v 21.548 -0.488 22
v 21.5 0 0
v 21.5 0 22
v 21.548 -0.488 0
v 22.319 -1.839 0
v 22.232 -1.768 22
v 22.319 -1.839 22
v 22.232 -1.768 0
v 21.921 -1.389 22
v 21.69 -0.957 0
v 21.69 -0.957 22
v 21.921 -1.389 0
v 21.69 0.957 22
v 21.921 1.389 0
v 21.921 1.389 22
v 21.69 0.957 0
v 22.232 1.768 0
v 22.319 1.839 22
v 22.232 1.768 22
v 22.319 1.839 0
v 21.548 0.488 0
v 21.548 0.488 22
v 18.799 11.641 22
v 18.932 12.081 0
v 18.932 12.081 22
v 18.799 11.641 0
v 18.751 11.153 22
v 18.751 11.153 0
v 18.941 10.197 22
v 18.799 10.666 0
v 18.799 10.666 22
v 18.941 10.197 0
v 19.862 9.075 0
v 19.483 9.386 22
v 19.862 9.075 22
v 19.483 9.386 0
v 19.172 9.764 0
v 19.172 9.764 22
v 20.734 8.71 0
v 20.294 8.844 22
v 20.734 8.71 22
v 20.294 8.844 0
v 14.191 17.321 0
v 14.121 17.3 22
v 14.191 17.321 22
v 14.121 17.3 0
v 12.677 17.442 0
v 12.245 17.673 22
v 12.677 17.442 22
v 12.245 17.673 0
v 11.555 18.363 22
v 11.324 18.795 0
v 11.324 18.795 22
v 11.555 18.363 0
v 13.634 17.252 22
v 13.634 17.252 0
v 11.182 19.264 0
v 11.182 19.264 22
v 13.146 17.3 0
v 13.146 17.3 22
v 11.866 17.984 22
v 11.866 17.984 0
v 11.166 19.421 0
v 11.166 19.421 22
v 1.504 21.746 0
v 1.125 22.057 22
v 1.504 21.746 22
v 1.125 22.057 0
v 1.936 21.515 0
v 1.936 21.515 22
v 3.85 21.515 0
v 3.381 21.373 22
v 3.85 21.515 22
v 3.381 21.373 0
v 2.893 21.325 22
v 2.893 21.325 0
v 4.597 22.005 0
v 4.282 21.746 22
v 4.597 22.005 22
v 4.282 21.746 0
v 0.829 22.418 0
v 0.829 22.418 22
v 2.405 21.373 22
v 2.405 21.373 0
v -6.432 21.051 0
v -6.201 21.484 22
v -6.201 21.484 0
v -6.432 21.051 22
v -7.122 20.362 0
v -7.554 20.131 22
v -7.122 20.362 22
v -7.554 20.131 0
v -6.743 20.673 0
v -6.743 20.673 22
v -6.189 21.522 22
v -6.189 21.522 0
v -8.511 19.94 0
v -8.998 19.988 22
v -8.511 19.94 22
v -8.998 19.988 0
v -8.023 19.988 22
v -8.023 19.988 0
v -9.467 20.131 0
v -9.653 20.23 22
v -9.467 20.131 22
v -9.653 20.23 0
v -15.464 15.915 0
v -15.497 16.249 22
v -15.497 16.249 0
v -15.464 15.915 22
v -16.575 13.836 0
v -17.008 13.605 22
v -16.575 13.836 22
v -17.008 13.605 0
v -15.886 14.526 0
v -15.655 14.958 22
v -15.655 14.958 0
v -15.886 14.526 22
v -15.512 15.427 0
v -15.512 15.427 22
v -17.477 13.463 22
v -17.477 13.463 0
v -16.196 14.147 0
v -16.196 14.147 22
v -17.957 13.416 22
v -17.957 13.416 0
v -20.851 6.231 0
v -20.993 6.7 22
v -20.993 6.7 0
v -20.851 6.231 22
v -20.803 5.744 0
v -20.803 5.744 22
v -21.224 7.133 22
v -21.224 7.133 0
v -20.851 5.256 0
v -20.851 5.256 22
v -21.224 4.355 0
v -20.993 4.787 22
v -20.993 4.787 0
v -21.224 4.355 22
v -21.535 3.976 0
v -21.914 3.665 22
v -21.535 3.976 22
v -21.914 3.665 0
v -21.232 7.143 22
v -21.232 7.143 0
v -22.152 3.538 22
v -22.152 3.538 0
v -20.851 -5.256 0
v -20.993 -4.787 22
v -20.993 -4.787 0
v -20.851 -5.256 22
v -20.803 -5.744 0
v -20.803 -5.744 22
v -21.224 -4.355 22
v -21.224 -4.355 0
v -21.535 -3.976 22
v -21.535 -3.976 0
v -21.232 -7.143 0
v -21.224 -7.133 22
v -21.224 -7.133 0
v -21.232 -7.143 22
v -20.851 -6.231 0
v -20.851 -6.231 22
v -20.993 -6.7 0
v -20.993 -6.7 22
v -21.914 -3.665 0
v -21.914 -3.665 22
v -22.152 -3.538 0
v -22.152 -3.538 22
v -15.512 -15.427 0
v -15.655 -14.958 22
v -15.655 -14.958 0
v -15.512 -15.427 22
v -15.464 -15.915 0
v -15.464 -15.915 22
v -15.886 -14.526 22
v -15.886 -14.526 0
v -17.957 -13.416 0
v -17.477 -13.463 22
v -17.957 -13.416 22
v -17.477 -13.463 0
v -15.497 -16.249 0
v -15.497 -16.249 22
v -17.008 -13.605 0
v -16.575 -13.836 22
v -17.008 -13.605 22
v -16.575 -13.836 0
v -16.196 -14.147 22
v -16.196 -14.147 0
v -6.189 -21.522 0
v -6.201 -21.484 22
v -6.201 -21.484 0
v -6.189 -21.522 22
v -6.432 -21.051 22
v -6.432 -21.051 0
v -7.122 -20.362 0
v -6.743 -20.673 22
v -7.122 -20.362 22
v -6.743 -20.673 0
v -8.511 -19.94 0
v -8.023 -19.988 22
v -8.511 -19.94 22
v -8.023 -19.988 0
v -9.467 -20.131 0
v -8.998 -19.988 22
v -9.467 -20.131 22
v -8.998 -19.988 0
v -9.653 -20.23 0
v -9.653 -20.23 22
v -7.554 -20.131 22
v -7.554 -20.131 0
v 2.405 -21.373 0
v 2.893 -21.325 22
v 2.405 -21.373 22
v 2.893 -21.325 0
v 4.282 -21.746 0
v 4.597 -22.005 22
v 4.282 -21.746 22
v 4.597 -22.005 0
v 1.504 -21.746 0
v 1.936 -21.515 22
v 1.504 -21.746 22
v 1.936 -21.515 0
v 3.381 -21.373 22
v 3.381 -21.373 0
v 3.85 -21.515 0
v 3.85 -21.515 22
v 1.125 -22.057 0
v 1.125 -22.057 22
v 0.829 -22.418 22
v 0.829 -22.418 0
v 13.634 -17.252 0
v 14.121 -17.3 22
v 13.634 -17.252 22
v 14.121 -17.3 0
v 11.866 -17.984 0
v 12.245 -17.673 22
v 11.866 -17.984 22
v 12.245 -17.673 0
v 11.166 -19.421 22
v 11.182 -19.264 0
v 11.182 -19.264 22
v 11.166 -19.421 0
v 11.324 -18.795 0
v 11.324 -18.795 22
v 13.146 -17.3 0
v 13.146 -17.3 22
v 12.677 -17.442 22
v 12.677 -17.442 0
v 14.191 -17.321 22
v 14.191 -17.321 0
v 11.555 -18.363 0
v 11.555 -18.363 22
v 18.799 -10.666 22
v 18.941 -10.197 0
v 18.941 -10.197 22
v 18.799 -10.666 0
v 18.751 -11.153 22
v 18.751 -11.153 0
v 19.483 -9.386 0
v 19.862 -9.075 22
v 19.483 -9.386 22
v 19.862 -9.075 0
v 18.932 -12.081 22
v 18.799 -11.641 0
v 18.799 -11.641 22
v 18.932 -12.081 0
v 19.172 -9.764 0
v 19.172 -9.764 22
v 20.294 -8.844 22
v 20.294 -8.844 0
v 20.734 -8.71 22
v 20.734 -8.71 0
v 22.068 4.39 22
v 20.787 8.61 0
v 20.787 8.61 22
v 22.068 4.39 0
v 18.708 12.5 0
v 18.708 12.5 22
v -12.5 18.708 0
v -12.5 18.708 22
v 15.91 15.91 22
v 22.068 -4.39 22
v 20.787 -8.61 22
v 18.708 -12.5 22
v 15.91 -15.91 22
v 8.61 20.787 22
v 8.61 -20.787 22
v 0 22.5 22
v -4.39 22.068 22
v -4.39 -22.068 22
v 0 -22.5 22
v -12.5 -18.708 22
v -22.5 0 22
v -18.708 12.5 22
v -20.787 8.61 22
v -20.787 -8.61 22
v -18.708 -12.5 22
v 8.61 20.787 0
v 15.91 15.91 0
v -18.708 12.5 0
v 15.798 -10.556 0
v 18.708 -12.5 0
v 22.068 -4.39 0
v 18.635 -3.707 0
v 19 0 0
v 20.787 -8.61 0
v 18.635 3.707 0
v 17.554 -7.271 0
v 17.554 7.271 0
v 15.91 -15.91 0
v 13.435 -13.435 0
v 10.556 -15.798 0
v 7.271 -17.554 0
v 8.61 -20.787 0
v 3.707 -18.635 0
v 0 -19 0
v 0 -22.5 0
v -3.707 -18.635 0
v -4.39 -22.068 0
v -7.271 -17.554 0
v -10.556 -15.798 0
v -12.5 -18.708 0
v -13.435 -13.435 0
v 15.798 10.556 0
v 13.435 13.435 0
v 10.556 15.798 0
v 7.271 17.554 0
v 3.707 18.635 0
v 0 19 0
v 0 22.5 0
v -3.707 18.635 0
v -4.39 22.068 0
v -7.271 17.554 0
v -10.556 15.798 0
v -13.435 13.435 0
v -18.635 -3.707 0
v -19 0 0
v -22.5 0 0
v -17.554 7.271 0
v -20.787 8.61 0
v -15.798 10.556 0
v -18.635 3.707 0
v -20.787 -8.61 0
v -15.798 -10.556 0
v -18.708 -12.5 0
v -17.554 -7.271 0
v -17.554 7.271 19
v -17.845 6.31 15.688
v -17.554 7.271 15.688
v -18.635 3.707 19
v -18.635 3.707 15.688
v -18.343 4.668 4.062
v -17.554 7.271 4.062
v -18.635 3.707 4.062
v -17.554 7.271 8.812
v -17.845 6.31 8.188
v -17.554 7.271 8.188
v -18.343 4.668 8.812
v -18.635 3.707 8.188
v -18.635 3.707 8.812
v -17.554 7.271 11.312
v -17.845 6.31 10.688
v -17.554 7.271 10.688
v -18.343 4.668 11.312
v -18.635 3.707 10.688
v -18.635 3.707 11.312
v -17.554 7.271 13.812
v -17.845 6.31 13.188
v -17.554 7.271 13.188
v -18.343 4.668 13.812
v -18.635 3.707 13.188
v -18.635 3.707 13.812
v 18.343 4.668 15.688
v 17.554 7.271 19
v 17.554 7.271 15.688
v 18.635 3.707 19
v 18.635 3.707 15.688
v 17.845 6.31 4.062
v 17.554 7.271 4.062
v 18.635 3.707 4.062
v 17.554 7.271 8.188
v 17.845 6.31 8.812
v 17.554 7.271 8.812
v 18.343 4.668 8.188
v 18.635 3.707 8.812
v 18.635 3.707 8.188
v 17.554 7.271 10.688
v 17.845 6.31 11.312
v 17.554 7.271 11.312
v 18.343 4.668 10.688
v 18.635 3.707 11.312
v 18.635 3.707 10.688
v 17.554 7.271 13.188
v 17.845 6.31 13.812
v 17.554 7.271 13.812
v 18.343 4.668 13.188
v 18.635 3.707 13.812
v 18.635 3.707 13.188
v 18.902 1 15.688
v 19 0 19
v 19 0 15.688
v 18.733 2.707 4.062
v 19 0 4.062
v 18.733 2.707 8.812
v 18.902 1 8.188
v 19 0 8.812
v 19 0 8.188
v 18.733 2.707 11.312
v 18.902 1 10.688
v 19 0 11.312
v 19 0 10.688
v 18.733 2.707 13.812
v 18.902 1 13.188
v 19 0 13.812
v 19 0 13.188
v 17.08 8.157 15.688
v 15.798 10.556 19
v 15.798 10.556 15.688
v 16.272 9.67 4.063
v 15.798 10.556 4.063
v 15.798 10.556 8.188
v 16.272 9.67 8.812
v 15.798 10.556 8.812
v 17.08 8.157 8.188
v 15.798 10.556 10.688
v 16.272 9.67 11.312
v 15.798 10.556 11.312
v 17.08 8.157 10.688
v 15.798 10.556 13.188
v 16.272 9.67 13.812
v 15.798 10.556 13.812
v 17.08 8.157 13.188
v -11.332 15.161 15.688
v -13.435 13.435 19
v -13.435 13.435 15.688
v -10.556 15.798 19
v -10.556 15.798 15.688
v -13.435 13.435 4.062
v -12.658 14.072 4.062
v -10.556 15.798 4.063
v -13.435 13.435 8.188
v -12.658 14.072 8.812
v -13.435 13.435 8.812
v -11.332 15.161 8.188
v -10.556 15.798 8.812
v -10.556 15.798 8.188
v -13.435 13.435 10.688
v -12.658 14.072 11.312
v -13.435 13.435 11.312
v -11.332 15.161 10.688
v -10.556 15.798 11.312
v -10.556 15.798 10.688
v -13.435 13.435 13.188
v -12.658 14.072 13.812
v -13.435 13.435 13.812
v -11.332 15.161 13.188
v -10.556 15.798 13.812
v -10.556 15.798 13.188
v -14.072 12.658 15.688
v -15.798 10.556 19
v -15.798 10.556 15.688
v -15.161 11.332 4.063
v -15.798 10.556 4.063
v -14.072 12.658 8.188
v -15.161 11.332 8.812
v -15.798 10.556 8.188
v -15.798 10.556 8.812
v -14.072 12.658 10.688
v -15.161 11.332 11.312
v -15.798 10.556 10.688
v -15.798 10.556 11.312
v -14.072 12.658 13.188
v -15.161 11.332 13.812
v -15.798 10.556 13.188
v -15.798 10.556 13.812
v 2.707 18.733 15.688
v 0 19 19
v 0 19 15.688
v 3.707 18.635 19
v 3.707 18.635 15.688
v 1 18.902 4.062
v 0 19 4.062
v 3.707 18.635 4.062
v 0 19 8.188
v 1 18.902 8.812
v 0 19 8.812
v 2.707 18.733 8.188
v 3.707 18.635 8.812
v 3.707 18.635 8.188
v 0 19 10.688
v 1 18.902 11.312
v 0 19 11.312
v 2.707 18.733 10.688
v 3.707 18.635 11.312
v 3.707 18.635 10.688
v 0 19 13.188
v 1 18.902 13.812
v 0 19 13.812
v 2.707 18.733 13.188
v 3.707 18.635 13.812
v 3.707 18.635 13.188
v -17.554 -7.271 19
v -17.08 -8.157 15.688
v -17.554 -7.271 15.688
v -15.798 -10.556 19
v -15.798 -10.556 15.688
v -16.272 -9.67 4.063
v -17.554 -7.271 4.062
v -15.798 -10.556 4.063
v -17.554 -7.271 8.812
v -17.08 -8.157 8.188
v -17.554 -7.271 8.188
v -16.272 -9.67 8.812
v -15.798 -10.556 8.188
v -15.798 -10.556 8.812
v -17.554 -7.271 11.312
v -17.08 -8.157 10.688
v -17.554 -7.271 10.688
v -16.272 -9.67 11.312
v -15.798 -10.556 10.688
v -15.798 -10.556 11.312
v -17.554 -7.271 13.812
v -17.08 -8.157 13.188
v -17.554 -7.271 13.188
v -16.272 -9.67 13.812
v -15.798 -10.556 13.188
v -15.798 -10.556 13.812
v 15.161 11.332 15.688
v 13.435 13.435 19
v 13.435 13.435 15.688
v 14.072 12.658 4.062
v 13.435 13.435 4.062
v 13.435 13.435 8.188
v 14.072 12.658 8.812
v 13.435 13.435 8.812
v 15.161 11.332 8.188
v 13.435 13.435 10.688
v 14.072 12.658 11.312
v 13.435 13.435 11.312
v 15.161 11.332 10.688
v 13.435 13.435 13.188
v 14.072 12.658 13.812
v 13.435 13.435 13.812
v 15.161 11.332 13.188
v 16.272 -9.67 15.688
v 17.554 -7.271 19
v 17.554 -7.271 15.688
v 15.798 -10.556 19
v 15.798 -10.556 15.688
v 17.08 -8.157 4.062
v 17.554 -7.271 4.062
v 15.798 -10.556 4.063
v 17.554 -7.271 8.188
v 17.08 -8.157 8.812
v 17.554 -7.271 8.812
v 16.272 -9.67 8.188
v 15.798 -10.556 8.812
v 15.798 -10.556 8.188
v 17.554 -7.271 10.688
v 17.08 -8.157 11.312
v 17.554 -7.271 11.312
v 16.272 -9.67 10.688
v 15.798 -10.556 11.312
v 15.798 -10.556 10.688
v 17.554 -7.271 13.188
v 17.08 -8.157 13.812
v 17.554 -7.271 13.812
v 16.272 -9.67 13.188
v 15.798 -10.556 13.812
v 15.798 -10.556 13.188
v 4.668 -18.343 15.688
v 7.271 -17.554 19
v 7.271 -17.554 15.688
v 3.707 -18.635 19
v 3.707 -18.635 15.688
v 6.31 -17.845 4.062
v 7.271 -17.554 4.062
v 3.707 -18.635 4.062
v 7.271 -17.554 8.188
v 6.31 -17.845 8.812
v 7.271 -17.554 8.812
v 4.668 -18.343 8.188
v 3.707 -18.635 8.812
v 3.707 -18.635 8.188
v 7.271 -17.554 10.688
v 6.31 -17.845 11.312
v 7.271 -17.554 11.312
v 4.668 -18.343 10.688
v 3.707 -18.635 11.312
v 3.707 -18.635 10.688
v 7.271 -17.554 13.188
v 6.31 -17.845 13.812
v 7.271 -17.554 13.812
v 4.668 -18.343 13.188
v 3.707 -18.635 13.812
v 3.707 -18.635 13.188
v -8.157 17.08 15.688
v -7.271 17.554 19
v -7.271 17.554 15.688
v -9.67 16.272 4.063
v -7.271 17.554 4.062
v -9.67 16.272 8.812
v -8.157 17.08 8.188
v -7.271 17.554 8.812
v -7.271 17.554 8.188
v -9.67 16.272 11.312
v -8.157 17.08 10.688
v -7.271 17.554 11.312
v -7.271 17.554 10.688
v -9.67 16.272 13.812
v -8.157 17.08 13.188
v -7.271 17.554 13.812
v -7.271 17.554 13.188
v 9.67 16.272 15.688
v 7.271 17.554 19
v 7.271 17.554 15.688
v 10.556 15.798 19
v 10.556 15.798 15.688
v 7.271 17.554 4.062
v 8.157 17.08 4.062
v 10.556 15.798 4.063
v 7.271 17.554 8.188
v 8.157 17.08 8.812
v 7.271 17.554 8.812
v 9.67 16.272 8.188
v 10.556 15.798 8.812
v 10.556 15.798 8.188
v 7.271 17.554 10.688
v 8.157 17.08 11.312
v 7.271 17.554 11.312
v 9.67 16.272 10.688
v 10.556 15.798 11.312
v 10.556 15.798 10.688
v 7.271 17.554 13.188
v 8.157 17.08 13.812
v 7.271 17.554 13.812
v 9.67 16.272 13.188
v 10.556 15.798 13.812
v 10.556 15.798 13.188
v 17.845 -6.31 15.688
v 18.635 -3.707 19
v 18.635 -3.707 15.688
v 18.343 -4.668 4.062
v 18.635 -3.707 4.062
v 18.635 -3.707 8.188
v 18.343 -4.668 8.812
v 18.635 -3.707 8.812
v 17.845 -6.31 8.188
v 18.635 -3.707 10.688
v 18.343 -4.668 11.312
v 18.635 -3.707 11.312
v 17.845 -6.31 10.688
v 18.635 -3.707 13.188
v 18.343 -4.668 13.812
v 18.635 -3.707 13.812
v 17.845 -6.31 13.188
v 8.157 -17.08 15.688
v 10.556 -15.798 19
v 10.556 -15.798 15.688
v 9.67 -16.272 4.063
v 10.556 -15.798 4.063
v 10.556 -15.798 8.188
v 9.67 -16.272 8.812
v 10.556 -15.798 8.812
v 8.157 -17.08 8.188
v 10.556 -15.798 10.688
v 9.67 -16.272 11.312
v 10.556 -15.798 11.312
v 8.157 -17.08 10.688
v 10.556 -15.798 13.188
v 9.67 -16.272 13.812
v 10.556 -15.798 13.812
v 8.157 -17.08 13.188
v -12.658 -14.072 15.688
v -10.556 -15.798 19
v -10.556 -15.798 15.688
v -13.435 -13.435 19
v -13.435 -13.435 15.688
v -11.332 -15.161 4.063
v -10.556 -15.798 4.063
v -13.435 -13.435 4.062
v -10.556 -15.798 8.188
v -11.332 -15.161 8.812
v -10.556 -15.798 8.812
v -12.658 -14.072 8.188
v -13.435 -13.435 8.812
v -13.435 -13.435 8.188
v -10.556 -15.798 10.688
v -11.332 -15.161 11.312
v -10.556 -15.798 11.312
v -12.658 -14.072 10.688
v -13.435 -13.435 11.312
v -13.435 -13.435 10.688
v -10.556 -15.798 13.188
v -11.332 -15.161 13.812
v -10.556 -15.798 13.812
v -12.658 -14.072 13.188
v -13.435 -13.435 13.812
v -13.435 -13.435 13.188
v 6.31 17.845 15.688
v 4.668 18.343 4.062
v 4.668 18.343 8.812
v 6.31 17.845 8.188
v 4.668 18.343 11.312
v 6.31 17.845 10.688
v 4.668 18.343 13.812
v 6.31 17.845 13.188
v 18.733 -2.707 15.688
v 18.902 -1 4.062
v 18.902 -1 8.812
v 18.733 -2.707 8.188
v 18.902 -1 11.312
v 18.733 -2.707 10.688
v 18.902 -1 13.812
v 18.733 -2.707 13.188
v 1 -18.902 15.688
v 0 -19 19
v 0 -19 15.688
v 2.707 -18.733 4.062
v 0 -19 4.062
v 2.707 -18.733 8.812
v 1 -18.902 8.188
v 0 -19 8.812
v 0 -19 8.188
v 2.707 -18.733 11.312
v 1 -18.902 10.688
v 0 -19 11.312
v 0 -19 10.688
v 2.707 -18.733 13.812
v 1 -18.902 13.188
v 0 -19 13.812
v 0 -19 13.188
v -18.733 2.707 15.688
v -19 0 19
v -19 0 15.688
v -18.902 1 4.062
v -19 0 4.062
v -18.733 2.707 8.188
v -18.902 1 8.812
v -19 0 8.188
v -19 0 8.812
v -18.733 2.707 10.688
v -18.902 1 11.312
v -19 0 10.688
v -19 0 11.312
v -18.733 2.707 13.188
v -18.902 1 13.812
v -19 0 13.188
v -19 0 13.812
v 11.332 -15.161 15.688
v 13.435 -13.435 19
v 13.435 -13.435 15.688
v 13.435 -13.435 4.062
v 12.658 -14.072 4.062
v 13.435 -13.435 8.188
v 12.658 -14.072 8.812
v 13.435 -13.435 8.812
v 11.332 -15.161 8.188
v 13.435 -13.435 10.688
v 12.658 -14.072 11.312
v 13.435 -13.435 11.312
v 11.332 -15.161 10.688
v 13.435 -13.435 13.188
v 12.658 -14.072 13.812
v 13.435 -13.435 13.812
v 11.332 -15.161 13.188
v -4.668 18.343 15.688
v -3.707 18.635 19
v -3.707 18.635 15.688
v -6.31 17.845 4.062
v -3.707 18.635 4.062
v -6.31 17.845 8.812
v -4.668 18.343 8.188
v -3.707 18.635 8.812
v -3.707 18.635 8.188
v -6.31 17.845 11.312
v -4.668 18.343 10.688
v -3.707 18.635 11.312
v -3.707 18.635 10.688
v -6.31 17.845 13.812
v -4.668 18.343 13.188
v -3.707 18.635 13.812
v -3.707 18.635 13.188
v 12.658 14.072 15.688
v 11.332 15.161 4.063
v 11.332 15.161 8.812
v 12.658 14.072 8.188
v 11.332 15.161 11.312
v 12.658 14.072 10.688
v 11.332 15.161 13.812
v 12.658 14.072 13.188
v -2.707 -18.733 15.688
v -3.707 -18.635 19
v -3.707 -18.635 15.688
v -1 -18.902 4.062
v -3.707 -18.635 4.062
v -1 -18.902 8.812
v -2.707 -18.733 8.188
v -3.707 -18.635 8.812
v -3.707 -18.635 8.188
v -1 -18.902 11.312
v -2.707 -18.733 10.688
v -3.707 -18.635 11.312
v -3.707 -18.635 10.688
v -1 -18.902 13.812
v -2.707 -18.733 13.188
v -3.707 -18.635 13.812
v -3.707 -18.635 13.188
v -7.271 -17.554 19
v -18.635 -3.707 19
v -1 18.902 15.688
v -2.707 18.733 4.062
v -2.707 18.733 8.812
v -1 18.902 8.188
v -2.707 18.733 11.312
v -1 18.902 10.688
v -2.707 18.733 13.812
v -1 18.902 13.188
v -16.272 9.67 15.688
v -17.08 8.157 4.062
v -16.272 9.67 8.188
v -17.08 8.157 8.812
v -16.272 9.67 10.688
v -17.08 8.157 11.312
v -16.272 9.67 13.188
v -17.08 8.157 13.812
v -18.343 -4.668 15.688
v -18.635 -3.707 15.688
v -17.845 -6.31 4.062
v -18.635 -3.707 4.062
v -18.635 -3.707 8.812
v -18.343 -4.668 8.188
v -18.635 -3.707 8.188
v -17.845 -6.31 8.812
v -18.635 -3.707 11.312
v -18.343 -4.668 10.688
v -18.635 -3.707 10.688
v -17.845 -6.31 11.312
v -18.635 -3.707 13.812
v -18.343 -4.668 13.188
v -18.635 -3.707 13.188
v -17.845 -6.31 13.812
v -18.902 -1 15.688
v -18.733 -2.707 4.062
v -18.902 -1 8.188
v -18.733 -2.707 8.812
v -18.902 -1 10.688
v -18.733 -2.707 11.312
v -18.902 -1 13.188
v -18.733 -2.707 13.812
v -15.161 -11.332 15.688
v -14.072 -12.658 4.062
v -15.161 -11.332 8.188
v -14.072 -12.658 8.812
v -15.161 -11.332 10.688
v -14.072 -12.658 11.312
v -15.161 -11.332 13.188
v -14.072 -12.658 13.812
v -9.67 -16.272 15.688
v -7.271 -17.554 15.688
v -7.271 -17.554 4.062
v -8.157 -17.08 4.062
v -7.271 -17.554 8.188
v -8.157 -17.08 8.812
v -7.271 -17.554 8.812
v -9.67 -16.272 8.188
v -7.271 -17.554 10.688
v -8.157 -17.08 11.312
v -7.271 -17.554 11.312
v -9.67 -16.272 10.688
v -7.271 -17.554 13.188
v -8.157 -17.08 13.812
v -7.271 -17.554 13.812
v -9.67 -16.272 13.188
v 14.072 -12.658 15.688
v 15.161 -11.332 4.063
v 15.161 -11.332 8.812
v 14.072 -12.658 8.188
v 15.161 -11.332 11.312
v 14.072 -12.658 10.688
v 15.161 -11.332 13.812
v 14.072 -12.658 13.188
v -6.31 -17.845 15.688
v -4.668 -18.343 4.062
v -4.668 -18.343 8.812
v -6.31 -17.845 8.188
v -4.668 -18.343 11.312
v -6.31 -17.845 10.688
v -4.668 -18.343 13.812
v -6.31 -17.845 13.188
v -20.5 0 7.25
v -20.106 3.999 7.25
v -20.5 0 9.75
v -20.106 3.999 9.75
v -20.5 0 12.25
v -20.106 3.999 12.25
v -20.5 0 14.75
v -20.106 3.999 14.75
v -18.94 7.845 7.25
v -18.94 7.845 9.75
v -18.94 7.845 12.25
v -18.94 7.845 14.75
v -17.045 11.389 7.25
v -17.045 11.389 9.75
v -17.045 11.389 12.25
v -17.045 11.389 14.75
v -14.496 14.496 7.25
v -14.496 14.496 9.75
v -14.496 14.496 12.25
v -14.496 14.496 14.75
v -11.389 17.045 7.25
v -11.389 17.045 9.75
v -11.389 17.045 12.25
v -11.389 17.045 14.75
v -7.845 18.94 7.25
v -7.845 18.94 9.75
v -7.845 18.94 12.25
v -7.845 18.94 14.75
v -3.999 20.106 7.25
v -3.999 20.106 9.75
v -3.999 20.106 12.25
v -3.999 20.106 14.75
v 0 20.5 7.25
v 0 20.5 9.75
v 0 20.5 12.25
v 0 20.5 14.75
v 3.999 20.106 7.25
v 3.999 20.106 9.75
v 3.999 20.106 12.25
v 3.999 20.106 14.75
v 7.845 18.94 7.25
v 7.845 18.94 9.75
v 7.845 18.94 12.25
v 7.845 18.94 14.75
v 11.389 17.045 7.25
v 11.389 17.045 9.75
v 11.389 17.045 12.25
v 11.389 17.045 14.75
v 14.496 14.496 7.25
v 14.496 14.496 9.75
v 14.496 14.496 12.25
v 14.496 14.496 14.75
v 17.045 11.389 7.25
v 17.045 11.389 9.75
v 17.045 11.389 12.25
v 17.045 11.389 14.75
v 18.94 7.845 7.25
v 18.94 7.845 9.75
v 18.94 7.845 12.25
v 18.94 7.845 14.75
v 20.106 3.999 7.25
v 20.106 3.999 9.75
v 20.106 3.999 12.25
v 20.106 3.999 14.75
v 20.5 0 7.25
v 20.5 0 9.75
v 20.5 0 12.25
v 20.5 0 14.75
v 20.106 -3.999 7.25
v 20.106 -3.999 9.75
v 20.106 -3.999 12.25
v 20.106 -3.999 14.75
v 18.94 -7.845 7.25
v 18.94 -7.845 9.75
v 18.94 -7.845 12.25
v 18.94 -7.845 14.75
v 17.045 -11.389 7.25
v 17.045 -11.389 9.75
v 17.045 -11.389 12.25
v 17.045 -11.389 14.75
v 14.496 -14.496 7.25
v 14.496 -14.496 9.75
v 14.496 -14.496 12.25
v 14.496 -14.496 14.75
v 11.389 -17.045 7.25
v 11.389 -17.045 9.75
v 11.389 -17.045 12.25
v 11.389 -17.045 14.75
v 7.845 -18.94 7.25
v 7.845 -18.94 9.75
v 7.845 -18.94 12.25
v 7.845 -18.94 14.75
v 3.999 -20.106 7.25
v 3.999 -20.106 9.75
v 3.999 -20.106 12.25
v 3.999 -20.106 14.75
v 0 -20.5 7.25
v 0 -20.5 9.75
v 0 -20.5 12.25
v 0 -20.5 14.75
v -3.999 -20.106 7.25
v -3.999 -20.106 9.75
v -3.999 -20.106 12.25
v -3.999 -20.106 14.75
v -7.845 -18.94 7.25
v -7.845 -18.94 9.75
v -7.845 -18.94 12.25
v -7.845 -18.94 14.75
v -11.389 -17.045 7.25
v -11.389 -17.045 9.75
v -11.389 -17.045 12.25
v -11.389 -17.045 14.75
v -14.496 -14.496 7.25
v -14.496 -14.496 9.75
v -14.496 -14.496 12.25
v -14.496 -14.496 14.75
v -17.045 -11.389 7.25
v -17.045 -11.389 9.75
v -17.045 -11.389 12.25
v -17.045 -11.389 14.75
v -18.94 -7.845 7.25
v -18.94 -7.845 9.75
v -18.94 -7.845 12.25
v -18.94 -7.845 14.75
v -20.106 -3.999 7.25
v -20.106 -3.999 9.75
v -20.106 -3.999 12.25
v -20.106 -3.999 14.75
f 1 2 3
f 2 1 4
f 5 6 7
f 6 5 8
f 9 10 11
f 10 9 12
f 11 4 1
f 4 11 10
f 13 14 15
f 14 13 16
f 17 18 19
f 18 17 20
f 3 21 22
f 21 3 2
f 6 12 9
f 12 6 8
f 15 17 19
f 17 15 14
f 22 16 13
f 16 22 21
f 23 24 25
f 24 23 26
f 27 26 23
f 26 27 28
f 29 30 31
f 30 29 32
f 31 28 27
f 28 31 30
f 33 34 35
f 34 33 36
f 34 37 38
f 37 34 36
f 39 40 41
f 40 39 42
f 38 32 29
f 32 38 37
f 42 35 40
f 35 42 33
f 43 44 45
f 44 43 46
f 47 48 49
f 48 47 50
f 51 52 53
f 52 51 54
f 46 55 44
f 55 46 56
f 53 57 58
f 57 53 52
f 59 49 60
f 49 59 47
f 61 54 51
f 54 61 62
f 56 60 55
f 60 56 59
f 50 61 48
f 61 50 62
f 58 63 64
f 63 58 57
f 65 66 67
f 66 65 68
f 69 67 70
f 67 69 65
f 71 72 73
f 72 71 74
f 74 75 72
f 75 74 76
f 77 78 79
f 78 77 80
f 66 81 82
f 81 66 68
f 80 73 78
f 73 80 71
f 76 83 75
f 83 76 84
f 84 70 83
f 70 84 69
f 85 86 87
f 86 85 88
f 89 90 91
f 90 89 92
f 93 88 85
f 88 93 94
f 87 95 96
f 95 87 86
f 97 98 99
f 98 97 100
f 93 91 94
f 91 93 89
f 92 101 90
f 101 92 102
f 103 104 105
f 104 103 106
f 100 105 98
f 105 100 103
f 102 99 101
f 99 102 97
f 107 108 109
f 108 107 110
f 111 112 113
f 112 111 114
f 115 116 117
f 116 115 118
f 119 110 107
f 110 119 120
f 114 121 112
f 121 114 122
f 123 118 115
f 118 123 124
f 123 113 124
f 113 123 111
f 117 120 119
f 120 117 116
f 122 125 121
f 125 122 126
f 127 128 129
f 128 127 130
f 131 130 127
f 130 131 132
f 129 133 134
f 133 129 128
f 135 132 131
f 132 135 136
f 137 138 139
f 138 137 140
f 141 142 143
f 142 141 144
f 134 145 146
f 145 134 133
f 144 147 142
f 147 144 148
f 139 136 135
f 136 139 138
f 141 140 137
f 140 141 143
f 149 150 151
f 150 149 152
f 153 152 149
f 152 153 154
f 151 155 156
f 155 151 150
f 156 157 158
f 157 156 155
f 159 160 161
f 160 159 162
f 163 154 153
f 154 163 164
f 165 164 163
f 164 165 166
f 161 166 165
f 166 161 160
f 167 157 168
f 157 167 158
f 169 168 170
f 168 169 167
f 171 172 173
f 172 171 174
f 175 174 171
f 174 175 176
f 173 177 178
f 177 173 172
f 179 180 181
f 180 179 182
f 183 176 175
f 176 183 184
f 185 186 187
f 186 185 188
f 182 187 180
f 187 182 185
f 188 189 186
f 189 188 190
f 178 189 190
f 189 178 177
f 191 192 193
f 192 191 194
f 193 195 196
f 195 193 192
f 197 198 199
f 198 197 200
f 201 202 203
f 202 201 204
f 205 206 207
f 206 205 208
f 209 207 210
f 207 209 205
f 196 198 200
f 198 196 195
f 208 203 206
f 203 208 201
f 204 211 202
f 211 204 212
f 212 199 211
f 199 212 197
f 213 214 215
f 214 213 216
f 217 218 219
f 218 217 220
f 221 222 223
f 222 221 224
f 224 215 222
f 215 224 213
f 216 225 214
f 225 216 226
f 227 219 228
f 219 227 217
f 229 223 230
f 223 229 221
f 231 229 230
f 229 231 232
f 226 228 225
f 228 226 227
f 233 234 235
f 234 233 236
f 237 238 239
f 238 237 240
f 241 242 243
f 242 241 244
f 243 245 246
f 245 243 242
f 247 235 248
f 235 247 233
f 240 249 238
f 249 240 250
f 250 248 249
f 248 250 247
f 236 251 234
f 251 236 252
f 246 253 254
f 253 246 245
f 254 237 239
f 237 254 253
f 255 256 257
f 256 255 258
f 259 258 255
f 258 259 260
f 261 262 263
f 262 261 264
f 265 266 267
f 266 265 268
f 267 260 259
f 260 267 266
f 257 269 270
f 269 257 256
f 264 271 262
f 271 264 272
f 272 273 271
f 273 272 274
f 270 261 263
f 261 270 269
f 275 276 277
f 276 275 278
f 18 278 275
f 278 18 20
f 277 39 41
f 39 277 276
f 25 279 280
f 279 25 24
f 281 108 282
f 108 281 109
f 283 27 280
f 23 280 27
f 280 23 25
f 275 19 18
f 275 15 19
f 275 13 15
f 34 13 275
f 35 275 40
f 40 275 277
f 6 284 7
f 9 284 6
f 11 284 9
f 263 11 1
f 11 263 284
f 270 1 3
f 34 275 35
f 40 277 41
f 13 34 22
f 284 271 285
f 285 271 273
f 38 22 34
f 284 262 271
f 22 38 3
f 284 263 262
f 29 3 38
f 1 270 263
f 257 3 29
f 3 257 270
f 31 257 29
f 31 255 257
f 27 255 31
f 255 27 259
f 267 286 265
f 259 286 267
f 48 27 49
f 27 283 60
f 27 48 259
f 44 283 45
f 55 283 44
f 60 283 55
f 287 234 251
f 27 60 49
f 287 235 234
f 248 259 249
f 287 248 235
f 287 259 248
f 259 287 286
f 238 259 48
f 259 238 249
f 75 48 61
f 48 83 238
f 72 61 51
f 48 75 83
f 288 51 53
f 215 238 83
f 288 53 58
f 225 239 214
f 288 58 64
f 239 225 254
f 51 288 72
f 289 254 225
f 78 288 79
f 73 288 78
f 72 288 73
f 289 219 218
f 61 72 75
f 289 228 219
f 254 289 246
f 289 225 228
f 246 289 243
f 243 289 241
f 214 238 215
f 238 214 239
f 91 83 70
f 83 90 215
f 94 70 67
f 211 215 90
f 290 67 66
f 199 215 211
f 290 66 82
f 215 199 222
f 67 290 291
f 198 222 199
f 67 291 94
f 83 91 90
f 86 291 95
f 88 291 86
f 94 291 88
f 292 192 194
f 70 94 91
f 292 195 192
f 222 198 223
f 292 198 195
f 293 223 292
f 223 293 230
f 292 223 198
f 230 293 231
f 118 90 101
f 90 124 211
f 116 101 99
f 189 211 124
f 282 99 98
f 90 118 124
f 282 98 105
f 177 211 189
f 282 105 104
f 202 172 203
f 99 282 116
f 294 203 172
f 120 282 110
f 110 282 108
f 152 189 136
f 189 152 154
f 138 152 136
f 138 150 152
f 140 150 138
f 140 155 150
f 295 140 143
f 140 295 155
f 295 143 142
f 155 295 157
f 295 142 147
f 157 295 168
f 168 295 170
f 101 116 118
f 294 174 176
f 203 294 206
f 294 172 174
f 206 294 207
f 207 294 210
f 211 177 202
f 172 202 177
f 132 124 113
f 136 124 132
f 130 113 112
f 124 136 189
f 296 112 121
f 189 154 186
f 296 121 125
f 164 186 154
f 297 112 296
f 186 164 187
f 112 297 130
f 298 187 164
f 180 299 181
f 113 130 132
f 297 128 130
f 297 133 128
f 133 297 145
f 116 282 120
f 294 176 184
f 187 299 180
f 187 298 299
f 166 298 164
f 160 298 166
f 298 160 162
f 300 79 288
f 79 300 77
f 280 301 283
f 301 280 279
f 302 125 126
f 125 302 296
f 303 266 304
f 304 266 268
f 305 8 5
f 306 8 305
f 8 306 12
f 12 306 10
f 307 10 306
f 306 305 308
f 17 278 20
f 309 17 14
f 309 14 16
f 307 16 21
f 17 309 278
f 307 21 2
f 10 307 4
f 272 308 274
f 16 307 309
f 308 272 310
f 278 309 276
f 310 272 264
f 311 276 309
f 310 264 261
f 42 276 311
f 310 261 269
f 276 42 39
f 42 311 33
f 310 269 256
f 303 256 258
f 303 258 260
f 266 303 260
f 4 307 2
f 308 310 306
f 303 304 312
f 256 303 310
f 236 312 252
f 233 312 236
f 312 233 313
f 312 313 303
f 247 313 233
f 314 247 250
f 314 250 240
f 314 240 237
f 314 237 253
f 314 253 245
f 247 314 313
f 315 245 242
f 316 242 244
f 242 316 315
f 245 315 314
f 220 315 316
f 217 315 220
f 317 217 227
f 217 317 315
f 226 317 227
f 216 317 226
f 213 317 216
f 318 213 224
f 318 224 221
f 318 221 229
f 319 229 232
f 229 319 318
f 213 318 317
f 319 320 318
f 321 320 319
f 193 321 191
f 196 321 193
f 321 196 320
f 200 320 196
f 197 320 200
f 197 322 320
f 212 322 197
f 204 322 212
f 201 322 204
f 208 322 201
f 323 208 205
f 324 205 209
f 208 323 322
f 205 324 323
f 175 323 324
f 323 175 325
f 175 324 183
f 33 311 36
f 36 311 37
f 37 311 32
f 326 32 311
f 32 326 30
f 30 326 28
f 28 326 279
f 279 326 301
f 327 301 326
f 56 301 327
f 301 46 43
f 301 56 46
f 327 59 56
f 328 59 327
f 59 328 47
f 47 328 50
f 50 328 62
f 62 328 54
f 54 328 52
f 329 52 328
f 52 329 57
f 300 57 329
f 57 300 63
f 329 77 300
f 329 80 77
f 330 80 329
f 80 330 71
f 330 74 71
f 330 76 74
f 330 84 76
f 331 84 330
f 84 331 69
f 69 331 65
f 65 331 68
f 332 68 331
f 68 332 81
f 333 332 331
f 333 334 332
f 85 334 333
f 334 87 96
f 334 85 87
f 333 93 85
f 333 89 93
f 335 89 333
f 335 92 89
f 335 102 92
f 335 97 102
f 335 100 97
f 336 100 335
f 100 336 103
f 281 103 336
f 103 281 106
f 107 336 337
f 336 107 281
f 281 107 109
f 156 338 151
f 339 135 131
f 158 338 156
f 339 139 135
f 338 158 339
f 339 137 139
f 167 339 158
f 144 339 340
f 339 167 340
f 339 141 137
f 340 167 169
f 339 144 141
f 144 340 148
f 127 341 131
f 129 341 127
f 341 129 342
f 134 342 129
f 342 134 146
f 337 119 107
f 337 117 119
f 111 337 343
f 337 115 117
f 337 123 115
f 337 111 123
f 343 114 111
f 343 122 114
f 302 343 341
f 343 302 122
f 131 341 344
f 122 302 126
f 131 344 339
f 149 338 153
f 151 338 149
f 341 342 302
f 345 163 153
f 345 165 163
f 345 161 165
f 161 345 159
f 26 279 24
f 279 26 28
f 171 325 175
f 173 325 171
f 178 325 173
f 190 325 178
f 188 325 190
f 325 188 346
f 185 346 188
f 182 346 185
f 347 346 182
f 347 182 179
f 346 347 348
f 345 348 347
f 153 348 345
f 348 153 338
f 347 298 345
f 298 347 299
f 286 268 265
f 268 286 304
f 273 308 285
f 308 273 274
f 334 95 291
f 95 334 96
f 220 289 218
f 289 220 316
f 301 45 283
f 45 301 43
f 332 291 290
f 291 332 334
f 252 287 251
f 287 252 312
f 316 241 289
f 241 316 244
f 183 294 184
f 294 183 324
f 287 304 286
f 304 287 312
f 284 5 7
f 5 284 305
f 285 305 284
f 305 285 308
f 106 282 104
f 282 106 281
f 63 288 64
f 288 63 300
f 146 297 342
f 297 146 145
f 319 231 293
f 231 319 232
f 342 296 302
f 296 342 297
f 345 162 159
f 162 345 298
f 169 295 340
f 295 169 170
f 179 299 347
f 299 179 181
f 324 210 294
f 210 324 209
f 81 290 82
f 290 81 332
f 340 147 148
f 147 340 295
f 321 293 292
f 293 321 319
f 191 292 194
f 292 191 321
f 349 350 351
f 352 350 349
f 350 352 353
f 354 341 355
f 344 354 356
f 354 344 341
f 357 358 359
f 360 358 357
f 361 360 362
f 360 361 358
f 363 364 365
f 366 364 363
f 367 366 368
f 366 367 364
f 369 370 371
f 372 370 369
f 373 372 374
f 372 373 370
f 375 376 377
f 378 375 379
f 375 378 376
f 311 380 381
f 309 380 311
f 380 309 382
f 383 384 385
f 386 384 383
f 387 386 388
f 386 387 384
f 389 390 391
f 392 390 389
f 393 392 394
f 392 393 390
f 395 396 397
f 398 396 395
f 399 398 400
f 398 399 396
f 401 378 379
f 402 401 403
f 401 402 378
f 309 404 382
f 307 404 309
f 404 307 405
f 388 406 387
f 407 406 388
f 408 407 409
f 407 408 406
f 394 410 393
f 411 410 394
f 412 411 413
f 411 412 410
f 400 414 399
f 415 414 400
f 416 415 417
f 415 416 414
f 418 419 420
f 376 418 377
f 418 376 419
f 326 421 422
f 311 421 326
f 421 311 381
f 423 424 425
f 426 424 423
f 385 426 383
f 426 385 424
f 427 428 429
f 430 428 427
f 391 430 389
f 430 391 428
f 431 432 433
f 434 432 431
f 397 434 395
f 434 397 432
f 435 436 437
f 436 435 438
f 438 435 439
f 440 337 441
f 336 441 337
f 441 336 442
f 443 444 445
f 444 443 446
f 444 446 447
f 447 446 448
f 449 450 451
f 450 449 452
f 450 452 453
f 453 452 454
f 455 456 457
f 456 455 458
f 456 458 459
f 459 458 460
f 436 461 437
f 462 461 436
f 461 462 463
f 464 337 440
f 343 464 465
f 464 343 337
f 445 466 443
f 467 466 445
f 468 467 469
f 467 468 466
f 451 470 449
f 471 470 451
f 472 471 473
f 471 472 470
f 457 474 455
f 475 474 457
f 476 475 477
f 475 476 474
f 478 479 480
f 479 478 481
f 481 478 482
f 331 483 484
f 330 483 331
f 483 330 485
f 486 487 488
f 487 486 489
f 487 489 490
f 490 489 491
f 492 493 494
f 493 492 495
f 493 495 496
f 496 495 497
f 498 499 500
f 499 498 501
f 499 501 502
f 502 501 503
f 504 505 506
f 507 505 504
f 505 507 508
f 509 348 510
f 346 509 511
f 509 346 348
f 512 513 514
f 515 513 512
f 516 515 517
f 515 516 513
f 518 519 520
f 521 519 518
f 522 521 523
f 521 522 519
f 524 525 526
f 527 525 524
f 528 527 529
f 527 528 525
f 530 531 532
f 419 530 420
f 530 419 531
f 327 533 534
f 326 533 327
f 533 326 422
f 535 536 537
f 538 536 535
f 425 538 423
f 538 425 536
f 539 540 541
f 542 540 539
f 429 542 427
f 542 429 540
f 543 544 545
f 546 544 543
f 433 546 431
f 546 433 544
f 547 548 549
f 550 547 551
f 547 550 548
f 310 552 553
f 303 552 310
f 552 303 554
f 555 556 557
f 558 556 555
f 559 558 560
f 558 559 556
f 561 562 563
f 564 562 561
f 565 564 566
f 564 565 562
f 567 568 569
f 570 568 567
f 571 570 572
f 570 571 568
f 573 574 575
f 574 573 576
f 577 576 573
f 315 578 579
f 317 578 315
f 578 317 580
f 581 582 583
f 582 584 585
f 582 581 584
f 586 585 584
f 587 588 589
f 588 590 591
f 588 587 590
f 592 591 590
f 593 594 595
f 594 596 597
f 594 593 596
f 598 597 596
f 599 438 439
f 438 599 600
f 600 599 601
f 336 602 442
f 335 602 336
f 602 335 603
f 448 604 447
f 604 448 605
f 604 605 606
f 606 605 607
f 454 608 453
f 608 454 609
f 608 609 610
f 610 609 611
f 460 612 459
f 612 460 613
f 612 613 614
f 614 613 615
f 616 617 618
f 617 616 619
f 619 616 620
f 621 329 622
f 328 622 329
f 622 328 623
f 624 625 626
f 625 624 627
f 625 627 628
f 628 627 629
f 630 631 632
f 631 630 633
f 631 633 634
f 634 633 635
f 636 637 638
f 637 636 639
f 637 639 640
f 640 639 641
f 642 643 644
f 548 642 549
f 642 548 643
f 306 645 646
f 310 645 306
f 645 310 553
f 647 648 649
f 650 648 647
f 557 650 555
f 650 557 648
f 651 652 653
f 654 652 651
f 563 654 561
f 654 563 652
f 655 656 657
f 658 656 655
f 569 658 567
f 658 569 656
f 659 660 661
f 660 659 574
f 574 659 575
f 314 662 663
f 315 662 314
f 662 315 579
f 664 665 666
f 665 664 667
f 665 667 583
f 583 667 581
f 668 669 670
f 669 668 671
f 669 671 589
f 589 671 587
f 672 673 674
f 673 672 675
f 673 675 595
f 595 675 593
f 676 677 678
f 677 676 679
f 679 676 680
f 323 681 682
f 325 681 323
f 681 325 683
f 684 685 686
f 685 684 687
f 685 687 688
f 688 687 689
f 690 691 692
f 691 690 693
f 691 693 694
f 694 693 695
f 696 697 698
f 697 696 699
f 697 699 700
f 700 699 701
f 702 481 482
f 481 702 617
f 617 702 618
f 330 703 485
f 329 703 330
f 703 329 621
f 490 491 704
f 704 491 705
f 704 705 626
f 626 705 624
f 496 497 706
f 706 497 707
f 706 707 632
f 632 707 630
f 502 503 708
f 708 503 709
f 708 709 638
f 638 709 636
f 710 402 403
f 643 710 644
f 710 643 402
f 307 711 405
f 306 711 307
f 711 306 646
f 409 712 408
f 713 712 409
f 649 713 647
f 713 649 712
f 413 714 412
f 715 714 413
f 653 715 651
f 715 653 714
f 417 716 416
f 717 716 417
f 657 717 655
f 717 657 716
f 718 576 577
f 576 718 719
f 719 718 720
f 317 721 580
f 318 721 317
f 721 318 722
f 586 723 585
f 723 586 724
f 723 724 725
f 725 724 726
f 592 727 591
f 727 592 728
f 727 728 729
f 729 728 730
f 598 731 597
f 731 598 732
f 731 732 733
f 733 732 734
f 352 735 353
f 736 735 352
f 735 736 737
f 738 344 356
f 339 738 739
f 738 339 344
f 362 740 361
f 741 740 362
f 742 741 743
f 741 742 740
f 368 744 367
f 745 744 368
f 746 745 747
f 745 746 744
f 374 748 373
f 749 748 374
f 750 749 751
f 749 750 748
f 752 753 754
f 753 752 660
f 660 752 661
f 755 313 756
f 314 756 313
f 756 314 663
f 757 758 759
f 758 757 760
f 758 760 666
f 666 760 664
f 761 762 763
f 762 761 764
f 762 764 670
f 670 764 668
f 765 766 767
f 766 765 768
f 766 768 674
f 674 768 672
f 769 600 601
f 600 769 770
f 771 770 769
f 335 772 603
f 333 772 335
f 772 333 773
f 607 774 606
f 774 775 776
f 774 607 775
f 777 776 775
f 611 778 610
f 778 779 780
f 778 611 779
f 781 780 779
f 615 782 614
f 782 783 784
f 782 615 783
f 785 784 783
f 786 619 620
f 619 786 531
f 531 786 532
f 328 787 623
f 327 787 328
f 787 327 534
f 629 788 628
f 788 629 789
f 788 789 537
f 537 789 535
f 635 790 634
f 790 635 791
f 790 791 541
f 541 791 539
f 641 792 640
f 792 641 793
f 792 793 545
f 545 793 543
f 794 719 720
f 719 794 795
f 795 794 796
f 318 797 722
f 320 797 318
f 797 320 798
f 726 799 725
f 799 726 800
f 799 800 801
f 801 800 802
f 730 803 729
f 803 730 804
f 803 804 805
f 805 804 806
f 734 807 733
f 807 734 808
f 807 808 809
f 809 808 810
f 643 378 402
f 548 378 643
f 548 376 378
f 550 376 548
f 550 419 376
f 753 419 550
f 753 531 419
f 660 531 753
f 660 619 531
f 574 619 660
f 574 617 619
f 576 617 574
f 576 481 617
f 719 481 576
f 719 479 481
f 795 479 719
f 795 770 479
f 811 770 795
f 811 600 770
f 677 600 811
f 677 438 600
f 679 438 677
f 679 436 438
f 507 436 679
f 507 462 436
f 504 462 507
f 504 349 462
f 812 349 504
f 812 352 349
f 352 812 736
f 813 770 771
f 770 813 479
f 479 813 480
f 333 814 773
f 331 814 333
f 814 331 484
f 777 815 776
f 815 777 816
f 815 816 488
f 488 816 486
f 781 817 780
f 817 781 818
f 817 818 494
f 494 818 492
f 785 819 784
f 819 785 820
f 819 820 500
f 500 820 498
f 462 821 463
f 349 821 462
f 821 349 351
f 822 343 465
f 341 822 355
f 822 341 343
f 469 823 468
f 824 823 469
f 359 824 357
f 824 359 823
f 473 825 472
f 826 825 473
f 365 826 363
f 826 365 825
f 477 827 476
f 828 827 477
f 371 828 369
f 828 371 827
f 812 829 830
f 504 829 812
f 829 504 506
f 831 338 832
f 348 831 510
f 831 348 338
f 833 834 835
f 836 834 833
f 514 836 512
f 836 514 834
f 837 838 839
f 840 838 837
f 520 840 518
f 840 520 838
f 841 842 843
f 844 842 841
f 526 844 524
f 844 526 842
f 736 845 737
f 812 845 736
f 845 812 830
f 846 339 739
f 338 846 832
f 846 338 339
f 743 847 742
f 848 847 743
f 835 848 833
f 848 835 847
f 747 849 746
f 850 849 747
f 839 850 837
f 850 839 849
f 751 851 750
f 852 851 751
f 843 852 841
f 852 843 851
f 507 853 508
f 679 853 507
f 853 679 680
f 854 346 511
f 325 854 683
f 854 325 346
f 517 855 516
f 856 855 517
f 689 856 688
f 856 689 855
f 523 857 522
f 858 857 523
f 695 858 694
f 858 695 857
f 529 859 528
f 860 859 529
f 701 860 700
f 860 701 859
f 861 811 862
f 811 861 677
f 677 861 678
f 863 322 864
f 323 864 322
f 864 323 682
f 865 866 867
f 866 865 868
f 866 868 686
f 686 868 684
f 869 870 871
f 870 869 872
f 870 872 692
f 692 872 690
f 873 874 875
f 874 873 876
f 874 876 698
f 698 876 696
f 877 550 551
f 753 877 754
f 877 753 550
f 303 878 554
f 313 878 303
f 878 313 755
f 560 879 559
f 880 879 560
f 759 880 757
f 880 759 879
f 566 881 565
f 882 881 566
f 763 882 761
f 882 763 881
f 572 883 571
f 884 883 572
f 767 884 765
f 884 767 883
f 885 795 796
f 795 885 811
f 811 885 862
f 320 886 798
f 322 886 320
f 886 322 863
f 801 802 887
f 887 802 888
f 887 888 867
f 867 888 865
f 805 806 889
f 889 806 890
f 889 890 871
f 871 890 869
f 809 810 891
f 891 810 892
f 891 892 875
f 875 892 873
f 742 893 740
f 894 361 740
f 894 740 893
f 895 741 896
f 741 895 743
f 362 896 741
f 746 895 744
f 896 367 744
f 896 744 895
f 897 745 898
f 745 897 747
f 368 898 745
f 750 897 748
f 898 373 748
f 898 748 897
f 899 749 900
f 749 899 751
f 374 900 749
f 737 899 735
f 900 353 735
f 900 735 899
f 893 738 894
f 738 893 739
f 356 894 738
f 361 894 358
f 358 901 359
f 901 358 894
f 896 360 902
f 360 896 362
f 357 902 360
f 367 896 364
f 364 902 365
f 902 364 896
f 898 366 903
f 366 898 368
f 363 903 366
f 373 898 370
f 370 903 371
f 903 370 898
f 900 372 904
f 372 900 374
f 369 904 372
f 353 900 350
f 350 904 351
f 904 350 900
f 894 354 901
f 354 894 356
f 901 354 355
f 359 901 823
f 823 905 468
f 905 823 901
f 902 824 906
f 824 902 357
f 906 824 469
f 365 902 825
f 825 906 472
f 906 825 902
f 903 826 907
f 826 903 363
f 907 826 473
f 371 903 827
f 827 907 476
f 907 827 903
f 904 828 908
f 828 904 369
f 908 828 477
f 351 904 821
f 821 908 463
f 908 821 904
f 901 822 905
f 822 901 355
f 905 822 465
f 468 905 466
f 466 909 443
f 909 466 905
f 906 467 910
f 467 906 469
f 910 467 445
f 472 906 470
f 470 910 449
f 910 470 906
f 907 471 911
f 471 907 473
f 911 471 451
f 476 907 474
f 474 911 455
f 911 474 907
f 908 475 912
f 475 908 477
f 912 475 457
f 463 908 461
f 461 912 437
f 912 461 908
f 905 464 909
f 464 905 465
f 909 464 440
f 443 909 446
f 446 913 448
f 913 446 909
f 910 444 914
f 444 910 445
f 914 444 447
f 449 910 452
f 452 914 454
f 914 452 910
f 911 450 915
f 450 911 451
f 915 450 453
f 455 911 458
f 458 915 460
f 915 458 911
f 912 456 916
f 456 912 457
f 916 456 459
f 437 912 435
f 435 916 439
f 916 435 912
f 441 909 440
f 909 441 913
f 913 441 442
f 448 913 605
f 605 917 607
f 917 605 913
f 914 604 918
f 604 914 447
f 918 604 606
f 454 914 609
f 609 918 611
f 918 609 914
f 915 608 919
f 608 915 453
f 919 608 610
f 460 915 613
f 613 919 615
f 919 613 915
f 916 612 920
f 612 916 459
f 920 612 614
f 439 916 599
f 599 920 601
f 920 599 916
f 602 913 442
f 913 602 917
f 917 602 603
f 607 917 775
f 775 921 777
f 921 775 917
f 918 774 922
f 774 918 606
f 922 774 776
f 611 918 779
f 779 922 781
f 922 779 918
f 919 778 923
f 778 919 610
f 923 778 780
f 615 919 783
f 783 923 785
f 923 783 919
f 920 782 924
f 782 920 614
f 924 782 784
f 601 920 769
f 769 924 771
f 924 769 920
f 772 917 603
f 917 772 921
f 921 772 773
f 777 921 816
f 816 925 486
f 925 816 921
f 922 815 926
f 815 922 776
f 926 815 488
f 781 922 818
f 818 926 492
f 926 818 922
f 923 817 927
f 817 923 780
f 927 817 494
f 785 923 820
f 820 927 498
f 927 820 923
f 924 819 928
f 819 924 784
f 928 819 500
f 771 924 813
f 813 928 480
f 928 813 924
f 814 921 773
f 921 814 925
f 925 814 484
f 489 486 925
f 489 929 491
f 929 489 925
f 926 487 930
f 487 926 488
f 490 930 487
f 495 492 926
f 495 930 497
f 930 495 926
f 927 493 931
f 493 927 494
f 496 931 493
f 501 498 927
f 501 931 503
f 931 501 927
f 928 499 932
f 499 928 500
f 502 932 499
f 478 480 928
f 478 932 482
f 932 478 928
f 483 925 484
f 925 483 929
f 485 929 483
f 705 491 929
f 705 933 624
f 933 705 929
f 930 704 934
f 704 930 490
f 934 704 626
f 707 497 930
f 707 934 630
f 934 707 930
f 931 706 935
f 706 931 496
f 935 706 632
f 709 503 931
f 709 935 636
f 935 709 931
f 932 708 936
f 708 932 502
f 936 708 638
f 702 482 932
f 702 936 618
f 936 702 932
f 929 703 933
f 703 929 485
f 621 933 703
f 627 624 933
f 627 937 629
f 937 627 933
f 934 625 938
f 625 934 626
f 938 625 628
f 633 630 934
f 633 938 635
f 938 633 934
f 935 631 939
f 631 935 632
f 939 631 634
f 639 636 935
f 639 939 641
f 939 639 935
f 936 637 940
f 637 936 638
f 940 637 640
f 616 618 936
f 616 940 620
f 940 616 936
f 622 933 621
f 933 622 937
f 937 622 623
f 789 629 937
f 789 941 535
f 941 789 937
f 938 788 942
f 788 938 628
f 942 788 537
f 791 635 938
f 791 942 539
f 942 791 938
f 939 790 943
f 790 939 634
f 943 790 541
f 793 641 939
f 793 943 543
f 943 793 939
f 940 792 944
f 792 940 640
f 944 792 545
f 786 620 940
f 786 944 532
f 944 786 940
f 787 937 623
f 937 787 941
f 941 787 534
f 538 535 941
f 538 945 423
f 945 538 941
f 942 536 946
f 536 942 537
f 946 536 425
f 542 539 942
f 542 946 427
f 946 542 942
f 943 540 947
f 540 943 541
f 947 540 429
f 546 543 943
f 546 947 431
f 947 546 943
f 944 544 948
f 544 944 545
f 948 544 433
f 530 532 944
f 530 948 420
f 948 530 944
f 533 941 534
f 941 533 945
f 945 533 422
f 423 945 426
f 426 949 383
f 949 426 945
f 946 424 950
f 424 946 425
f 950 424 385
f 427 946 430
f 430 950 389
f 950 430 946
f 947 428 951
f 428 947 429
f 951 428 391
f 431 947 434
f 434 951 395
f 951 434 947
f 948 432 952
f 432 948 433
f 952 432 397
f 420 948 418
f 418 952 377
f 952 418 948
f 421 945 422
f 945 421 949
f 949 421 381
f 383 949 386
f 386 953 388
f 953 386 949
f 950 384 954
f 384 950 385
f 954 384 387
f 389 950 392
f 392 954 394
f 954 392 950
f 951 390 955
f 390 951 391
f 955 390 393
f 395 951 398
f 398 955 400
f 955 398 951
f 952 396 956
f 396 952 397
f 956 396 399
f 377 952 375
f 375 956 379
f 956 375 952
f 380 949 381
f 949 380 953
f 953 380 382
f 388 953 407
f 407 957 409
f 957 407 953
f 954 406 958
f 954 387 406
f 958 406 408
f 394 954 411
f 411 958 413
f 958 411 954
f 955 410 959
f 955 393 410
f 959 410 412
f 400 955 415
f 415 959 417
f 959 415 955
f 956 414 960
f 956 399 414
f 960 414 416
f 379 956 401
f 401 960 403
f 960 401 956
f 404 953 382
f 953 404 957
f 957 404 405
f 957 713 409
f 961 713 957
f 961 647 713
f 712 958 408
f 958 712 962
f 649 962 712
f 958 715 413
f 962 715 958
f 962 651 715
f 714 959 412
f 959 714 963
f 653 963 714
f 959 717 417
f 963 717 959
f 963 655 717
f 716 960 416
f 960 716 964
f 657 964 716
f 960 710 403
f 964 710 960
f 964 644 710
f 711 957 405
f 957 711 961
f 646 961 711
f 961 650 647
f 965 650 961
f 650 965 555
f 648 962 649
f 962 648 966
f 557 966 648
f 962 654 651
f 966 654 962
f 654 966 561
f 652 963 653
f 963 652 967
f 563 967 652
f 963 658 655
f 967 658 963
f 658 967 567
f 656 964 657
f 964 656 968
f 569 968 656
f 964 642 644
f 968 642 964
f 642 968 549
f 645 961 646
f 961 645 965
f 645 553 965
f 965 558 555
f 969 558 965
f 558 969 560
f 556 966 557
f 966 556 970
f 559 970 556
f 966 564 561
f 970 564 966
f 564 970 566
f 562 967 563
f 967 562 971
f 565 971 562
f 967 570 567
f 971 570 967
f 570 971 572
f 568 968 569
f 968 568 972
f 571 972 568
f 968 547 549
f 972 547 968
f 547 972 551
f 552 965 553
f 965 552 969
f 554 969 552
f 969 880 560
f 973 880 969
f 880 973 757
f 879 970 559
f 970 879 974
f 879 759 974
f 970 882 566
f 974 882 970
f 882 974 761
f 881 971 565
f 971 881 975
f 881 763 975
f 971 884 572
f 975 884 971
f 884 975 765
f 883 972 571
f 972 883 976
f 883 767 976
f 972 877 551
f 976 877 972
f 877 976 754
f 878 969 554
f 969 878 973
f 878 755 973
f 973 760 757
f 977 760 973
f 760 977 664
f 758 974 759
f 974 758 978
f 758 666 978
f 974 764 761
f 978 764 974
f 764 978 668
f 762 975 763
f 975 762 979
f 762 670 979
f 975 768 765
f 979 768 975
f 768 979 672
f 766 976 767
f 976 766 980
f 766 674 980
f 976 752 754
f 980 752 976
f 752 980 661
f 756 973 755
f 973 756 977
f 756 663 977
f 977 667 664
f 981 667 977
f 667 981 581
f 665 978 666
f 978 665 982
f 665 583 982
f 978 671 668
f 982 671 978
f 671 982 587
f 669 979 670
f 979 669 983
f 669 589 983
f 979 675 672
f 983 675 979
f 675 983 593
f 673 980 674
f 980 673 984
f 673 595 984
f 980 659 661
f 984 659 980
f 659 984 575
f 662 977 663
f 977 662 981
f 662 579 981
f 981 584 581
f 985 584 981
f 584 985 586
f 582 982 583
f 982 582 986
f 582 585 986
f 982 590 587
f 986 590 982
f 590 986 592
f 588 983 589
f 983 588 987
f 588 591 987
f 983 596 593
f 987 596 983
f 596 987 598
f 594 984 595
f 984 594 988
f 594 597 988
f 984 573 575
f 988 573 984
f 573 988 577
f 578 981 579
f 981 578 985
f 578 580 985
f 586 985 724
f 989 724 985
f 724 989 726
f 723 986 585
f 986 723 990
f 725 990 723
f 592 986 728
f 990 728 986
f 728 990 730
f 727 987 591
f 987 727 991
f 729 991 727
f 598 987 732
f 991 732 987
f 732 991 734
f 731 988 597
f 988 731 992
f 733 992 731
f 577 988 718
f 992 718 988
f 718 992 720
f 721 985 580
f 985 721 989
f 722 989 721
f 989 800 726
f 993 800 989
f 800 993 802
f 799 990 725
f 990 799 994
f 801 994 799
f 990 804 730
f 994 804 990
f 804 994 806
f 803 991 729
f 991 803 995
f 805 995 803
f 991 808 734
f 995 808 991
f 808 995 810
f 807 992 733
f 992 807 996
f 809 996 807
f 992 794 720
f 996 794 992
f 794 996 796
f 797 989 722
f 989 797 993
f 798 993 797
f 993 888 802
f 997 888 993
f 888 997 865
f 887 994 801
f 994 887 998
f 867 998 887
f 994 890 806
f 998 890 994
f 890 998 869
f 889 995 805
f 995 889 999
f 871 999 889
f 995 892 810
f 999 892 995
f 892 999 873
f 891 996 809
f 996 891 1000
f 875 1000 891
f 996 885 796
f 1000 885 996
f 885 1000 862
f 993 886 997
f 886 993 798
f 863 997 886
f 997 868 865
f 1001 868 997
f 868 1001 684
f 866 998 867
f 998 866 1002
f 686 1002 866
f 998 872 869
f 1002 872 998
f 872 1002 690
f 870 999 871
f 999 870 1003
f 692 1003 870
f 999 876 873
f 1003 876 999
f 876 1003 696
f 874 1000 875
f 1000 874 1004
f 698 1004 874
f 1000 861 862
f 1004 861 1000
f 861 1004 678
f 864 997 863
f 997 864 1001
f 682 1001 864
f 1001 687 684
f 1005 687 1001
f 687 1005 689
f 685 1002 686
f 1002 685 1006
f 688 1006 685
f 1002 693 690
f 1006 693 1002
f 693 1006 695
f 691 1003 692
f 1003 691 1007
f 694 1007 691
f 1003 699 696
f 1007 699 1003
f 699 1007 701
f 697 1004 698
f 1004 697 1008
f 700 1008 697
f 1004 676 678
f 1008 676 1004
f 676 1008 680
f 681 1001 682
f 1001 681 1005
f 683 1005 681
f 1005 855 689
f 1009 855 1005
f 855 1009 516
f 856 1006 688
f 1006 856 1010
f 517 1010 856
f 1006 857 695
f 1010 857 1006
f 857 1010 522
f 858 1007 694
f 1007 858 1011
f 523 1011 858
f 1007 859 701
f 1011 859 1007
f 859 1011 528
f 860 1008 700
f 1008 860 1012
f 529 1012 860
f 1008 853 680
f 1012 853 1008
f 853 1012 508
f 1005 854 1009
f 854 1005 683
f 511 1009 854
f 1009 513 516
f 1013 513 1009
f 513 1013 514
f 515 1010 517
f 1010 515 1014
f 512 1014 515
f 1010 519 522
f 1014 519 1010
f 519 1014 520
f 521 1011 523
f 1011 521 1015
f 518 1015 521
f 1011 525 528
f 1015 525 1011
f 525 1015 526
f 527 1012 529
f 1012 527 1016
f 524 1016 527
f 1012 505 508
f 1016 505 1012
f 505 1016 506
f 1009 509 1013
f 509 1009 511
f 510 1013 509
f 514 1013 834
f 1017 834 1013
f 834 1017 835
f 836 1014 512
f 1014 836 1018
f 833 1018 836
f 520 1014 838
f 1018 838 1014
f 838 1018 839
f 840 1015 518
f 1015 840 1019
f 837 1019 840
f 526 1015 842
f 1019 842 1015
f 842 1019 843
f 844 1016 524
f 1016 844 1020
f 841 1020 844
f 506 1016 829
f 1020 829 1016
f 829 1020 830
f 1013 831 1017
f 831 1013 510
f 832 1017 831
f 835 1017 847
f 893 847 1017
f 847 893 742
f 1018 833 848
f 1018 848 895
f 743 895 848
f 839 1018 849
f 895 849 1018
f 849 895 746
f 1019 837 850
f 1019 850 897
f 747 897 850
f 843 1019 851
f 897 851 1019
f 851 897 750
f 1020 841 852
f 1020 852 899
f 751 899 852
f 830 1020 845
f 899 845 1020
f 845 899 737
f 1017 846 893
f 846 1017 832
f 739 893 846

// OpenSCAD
$fn = 32;

// ----------------------------------------------------------------------
// Threaded cap: 45 mm body, 22 mm tall, 38 mm threaded bore
// ----------------------------------------------------------------------

// --- parameters (mm) ---
outer_d = 45;             // cap outside diameter
body_h = 22;              // cap height
top_t = 3;                // closed top thickness
bore_d = 38;              // bore core diameter
pitch = 2.5;              // thread pitch
thread_d = 1.5;           // thread depth
thread_z = 3;             // thread start above the rim
thread_h = 13;            // threaded height
flutes = 13;              // number of knurl flutes
flute_d = 5;              // flute cutter diameter
flute_depth = 1;          // flute depth into the rim

difference() {
  union() {
    cylinder(h = 22, d = outer_d);
  }
  /* threaded bore, closed at the top */
  translate([0, 0, -2.5]) cylinder(h = 21.5, d = bore_d);
  translate([0, 0, 3]) rotate_extrude() polygon([[18, 0], [18, 13], [18.5, 13], [20.5, 11.75], [18.5, 10.5], [20.5, 9.25], [18.5, 8], [20.5, 6.75], [18.5, 5.5], [20.5, 4.25], [18.5, 0], [18, 0]]);
  /* knurl flutes around the rim */
  for (i = [0 : flutes - 1]) {
    a = i * 360 / flutes;
    translate([(outer_d / 2 + flute_d / 2 - flute_depth) * cos(a), (outer_d / 2 + flute_d / 2 - flute_depth) * sin(a), -2.5]) cylinder(h = body_h + 5, d = flute_d);
  }
}
